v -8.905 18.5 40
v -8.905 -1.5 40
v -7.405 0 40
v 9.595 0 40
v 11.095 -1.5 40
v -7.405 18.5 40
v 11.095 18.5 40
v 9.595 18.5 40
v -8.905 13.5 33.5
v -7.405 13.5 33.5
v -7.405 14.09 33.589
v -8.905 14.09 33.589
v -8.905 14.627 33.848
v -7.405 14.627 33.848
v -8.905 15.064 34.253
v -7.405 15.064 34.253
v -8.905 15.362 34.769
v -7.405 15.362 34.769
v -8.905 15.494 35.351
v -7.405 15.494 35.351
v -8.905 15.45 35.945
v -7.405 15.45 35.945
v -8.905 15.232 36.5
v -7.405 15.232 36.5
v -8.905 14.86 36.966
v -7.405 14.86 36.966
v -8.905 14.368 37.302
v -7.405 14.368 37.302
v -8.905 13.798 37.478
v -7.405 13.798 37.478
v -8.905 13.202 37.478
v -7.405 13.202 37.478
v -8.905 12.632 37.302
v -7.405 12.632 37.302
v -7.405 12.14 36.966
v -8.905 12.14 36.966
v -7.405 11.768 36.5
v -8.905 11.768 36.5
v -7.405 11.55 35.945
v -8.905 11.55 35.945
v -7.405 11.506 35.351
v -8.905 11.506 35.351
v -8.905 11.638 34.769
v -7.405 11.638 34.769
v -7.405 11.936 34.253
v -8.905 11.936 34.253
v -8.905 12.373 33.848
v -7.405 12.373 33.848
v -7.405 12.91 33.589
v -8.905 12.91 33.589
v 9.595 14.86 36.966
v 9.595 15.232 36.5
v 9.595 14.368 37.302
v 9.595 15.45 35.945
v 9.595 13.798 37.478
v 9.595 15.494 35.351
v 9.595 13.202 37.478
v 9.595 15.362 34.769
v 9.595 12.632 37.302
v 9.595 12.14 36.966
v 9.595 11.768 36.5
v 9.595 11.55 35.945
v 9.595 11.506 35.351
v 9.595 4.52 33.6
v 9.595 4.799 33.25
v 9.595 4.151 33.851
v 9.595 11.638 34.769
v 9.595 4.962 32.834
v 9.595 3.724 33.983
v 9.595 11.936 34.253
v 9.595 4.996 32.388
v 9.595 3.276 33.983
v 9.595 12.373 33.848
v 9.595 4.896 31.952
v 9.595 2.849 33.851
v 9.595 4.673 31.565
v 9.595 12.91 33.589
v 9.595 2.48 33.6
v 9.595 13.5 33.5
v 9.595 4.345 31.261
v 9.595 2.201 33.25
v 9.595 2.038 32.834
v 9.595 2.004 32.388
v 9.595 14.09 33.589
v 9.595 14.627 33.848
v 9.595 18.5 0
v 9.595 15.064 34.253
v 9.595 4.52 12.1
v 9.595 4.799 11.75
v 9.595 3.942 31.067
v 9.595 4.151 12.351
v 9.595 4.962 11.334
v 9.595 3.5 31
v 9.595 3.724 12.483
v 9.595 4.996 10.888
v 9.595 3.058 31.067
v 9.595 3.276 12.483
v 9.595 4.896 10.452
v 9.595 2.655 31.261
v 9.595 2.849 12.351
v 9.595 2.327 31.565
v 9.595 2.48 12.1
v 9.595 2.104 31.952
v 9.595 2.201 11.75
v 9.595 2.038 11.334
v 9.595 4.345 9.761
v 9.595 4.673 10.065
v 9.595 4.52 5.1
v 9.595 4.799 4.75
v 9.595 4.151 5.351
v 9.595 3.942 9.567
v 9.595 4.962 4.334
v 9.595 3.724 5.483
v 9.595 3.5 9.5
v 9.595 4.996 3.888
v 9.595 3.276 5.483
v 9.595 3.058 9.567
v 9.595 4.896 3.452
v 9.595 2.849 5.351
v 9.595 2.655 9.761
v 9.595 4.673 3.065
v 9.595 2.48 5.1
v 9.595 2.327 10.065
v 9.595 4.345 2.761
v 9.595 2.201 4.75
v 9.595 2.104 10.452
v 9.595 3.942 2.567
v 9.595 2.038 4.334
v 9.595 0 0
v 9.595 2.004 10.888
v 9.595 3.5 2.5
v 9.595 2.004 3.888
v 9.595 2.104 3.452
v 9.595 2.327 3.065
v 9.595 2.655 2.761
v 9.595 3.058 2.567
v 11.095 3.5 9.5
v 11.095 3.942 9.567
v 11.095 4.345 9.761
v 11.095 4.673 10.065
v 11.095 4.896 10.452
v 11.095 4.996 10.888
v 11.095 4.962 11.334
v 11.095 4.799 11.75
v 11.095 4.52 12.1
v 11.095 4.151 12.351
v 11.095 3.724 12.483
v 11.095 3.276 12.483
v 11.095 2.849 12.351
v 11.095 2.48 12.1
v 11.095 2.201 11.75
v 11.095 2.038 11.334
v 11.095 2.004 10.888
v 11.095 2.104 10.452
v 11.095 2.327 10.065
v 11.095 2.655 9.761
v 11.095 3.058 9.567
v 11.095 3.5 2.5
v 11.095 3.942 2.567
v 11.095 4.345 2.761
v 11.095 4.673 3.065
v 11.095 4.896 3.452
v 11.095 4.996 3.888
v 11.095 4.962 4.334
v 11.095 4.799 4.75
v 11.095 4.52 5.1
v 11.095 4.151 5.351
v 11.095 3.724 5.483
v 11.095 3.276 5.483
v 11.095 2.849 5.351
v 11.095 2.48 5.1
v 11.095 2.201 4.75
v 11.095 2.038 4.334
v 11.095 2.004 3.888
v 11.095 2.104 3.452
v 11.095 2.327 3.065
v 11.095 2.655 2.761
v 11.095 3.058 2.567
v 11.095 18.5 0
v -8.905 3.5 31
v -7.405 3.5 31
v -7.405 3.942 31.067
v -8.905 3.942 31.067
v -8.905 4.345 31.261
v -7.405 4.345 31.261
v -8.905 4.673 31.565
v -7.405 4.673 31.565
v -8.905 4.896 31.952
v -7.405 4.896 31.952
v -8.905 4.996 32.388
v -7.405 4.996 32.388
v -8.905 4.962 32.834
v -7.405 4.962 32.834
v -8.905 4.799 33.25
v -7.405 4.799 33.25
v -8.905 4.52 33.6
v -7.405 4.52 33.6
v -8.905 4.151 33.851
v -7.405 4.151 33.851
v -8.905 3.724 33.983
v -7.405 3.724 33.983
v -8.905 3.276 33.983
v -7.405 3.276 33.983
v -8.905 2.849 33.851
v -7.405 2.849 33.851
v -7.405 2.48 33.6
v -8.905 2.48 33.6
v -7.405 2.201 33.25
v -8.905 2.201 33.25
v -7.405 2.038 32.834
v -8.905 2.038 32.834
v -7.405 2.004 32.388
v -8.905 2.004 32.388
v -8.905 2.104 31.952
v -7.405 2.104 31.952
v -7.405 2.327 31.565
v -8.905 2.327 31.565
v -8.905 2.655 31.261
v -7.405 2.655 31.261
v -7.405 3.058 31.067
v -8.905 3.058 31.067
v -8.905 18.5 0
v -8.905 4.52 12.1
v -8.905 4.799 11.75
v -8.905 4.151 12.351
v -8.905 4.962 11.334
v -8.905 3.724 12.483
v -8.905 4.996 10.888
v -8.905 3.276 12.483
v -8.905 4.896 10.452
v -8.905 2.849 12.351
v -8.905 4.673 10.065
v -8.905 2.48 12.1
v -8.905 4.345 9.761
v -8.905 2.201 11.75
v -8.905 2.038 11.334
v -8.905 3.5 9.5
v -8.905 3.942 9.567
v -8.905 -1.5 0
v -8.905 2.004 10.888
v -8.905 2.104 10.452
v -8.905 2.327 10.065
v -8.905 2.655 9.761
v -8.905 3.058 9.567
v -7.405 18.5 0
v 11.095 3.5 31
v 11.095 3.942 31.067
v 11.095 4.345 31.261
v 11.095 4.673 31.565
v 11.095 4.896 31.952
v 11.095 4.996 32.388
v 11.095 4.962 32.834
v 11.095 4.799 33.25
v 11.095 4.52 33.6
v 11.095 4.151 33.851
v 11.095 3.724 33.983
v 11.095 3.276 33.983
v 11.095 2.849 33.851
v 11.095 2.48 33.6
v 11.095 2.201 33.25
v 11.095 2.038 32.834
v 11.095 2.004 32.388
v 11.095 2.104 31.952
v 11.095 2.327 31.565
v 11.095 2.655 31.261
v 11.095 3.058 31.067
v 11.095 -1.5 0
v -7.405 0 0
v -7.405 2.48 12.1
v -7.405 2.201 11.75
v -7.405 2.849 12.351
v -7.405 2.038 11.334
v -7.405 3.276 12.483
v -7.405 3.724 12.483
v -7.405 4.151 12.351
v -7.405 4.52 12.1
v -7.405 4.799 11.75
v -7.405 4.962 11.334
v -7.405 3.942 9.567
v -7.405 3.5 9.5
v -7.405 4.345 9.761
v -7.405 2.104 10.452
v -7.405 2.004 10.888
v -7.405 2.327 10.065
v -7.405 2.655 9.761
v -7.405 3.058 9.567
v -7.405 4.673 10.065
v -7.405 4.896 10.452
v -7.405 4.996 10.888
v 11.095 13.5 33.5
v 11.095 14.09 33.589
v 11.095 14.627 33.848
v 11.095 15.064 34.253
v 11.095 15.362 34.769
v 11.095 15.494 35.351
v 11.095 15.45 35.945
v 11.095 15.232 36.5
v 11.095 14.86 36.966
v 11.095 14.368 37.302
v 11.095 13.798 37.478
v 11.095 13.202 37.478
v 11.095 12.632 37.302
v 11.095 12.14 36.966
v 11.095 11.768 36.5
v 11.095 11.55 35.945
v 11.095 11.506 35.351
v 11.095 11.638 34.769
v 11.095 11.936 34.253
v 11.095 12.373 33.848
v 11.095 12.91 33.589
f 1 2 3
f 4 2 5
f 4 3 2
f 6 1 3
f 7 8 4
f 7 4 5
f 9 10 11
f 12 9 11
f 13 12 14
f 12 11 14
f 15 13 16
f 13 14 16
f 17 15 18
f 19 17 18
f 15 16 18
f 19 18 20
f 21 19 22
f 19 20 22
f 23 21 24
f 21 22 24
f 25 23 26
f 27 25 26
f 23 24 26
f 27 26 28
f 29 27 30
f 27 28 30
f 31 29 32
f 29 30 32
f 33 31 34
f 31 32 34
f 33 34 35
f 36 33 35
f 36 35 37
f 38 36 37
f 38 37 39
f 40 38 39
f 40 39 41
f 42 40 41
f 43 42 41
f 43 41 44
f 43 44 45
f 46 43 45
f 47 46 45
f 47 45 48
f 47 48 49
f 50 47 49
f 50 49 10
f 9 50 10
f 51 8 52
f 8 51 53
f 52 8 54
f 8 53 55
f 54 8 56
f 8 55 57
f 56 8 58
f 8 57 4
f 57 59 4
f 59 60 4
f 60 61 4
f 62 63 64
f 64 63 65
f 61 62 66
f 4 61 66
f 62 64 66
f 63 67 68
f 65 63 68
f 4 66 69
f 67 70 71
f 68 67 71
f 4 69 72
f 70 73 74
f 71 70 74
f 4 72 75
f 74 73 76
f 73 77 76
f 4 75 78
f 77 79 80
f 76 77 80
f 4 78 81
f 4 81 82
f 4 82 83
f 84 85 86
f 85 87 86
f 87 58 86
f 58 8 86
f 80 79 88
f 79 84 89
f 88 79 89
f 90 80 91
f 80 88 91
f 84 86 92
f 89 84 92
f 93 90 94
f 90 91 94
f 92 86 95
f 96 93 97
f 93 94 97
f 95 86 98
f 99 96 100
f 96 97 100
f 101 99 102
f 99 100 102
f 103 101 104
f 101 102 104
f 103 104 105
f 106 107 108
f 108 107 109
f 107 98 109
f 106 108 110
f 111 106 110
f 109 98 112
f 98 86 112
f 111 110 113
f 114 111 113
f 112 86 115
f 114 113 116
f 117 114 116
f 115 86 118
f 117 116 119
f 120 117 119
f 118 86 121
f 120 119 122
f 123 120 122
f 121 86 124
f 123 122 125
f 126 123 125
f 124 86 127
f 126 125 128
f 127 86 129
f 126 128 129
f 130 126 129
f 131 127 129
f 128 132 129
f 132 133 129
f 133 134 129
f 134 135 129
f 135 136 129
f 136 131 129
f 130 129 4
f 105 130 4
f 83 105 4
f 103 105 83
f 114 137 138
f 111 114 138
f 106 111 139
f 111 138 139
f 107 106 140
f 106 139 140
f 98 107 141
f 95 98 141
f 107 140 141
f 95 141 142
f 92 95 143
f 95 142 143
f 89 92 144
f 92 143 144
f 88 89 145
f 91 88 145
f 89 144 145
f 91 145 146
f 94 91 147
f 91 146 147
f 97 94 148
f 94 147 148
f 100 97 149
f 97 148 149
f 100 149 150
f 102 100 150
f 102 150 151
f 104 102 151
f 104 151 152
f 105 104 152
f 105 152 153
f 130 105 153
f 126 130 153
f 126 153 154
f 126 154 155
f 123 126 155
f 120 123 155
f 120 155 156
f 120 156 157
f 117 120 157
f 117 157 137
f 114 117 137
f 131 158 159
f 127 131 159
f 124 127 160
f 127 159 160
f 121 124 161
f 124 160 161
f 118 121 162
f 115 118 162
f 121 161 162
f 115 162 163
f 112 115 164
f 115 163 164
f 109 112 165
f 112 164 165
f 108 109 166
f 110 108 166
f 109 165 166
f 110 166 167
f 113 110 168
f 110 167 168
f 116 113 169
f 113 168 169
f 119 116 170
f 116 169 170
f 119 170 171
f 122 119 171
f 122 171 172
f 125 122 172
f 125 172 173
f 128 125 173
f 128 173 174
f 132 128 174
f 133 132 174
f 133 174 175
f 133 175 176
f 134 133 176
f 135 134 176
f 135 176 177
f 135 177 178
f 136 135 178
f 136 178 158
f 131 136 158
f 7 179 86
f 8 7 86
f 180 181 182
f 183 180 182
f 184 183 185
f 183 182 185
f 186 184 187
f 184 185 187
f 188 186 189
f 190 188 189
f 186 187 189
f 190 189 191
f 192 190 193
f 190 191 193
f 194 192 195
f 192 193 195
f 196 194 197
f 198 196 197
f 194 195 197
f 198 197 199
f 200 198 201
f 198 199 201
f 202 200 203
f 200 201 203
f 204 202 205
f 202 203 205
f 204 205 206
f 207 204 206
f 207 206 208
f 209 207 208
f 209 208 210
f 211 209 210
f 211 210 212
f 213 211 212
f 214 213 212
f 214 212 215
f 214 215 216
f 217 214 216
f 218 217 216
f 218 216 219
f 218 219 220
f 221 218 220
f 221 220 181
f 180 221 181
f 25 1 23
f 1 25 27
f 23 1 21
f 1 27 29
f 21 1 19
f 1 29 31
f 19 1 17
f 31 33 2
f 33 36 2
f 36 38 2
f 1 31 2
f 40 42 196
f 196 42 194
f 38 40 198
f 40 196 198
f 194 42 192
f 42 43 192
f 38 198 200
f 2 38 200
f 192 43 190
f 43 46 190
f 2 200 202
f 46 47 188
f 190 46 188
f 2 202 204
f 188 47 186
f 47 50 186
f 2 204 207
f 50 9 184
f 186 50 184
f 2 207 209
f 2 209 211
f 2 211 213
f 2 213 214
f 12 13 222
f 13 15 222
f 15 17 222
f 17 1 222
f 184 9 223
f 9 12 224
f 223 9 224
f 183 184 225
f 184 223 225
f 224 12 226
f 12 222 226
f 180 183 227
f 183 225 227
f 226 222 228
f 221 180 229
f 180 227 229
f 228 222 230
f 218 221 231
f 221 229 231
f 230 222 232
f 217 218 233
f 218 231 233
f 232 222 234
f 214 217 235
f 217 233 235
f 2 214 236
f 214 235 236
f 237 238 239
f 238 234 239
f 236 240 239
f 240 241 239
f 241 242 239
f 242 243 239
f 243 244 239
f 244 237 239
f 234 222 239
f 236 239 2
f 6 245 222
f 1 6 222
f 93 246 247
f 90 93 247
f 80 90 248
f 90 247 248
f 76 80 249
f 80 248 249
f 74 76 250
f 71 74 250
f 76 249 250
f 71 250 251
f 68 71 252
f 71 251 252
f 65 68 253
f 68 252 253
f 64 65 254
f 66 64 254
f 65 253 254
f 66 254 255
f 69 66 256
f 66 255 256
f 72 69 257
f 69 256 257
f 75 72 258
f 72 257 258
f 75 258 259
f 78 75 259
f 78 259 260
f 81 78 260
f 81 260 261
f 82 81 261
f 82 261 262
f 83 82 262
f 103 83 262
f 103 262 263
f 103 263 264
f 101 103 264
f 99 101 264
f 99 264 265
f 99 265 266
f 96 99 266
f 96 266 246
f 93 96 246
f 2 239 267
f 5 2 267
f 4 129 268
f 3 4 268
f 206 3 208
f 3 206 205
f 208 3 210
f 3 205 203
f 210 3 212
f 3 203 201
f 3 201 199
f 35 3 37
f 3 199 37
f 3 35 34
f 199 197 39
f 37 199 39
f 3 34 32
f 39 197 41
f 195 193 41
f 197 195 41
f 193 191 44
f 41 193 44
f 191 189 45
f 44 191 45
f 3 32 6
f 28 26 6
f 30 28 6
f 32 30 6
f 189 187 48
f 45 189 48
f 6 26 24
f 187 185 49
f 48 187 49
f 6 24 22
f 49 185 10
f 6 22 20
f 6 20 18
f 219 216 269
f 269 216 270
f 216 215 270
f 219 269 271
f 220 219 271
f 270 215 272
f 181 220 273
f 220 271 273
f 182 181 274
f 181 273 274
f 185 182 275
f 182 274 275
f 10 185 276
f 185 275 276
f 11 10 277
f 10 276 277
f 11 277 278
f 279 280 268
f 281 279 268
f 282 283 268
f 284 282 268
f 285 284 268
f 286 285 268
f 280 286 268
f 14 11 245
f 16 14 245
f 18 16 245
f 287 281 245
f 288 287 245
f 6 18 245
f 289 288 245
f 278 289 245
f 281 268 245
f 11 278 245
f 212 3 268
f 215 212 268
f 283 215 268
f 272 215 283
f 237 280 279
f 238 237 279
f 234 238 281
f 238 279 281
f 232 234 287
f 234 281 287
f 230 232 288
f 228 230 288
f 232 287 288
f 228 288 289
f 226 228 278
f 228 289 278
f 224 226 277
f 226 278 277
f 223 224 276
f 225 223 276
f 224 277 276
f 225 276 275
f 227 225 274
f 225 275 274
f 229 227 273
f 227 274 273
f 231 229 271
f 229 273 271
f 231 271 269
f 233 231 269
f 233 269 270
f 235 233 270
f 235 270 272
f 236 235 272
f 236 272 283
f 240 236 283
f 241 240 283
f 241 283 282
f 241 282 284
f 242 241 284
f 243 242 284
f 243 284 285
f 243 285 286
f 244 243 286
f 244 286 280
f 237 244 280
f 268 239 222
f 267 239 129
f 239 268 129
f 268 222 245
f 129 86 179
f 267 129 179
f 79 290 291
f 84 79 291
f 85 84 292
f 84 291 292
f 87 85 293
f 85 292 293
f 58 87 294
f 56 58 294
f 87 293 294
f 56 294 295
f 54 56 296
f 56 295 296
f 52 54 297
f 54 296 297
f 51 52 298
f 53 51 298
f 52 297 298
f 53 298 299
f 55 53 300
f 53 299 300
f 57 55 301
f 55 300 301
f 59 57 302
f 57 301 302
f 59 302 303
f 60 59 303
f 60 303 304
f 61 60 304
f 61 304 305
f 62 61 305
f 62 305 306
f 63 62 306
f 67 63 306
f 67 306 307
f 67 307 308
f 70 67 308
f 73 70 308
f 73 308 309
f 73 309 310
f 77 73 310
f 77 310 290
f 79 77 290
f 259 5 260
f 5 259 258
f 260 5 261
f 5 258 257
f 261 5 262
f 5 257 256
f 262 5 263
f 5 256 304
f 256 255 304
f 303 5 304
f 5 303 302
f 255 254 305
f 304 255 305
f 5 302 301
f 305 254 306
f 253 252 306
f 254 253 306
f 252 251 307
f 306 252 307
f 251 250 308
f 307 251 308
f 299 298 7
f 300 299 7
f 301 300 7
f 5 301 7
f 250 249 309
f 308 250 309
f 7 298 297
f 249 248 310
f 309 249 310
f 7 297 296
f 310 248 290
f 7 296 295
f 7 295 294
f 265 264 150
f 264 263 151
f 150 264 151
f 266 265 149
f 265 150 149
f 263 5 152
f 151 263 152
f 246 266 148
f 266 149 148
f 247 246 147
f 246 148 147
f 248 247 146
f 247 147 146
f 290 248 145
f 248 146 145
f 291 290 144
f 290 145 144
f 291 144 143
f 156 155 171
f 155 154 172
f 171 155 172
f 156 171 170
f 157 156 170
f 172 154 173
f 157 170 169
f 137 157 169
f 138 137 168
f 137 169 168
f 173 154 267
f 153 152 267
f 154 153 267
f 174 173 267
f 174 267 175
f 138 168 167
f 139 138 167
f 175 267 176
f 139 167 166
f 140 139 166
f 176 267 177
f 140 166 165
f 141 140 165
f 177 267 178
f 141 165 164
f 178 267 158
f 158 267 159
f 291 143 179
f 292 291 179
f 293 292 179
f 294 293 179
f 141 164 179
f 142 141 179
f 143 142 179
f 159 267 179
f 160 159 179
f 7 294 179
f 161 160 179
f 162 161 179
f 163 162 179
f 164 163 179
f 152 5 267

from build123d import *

# Parameters (mm, degrees)
EXTRUSION1_DEPTH = 40
ESQUISSE2_R      = 1.5
ESQUISSE2_R_2    = 2
EXTRUSION2_DEPTH = 49.396797415
ESQUISSE3_R      = 1.5
EXTRUSION3_DEPTH = 6


with BuildPart() as part:
    # Esquisse1 → Extrusion1 (new body)
    with BuildSketch(Plane.XY):
        Polygon((-8.904835854, 18.5), (-8.904835854, -1.5), (11.095164146, -1.5), (11.095164146, 18.5), (9.595164146, 18.5), (9.595164146, 0), (-7.404835854, 0), (-7.404835854, 18.5), align=None)
    extrude(amount=EXTRUSION1_DEPTH)

    # Esquisse2 → Extrusion2 (cut, through all)
    with BuildSketch(Plane(origin=(11.095164146, 0, 0), x_dir=(0, 0, -1), z_dir=(1, 0, 0))):
        with Locations((-32.5, 3.5)):
            Circle(ESQUISSE2_R)
        with Locations((-11, 3.5)):
            Circle(ESQUISSE2_R)
        with Locations((-35.5, 13.5)):
            Circle(ESQUISSE2_R_2)
    extrude(amount=-EXTRUSION2_DEPTH, mode=Mode.SUBTRACT)

    # Esquisse3 → Extrusion3 (cut)
    with BuildSketch(Plane(origin=(11.095164146, 0, 0), x_dir=(0, 0, -1), z_dir=(1, 0, 0))):
        with Locations((-4, 3.5)):
            Circle(ESQUISSE3_R)
    extrude(amount=-EXTRUSION3_DEPTH, mode=Mode.SUBTRACT)


solid = part.part
